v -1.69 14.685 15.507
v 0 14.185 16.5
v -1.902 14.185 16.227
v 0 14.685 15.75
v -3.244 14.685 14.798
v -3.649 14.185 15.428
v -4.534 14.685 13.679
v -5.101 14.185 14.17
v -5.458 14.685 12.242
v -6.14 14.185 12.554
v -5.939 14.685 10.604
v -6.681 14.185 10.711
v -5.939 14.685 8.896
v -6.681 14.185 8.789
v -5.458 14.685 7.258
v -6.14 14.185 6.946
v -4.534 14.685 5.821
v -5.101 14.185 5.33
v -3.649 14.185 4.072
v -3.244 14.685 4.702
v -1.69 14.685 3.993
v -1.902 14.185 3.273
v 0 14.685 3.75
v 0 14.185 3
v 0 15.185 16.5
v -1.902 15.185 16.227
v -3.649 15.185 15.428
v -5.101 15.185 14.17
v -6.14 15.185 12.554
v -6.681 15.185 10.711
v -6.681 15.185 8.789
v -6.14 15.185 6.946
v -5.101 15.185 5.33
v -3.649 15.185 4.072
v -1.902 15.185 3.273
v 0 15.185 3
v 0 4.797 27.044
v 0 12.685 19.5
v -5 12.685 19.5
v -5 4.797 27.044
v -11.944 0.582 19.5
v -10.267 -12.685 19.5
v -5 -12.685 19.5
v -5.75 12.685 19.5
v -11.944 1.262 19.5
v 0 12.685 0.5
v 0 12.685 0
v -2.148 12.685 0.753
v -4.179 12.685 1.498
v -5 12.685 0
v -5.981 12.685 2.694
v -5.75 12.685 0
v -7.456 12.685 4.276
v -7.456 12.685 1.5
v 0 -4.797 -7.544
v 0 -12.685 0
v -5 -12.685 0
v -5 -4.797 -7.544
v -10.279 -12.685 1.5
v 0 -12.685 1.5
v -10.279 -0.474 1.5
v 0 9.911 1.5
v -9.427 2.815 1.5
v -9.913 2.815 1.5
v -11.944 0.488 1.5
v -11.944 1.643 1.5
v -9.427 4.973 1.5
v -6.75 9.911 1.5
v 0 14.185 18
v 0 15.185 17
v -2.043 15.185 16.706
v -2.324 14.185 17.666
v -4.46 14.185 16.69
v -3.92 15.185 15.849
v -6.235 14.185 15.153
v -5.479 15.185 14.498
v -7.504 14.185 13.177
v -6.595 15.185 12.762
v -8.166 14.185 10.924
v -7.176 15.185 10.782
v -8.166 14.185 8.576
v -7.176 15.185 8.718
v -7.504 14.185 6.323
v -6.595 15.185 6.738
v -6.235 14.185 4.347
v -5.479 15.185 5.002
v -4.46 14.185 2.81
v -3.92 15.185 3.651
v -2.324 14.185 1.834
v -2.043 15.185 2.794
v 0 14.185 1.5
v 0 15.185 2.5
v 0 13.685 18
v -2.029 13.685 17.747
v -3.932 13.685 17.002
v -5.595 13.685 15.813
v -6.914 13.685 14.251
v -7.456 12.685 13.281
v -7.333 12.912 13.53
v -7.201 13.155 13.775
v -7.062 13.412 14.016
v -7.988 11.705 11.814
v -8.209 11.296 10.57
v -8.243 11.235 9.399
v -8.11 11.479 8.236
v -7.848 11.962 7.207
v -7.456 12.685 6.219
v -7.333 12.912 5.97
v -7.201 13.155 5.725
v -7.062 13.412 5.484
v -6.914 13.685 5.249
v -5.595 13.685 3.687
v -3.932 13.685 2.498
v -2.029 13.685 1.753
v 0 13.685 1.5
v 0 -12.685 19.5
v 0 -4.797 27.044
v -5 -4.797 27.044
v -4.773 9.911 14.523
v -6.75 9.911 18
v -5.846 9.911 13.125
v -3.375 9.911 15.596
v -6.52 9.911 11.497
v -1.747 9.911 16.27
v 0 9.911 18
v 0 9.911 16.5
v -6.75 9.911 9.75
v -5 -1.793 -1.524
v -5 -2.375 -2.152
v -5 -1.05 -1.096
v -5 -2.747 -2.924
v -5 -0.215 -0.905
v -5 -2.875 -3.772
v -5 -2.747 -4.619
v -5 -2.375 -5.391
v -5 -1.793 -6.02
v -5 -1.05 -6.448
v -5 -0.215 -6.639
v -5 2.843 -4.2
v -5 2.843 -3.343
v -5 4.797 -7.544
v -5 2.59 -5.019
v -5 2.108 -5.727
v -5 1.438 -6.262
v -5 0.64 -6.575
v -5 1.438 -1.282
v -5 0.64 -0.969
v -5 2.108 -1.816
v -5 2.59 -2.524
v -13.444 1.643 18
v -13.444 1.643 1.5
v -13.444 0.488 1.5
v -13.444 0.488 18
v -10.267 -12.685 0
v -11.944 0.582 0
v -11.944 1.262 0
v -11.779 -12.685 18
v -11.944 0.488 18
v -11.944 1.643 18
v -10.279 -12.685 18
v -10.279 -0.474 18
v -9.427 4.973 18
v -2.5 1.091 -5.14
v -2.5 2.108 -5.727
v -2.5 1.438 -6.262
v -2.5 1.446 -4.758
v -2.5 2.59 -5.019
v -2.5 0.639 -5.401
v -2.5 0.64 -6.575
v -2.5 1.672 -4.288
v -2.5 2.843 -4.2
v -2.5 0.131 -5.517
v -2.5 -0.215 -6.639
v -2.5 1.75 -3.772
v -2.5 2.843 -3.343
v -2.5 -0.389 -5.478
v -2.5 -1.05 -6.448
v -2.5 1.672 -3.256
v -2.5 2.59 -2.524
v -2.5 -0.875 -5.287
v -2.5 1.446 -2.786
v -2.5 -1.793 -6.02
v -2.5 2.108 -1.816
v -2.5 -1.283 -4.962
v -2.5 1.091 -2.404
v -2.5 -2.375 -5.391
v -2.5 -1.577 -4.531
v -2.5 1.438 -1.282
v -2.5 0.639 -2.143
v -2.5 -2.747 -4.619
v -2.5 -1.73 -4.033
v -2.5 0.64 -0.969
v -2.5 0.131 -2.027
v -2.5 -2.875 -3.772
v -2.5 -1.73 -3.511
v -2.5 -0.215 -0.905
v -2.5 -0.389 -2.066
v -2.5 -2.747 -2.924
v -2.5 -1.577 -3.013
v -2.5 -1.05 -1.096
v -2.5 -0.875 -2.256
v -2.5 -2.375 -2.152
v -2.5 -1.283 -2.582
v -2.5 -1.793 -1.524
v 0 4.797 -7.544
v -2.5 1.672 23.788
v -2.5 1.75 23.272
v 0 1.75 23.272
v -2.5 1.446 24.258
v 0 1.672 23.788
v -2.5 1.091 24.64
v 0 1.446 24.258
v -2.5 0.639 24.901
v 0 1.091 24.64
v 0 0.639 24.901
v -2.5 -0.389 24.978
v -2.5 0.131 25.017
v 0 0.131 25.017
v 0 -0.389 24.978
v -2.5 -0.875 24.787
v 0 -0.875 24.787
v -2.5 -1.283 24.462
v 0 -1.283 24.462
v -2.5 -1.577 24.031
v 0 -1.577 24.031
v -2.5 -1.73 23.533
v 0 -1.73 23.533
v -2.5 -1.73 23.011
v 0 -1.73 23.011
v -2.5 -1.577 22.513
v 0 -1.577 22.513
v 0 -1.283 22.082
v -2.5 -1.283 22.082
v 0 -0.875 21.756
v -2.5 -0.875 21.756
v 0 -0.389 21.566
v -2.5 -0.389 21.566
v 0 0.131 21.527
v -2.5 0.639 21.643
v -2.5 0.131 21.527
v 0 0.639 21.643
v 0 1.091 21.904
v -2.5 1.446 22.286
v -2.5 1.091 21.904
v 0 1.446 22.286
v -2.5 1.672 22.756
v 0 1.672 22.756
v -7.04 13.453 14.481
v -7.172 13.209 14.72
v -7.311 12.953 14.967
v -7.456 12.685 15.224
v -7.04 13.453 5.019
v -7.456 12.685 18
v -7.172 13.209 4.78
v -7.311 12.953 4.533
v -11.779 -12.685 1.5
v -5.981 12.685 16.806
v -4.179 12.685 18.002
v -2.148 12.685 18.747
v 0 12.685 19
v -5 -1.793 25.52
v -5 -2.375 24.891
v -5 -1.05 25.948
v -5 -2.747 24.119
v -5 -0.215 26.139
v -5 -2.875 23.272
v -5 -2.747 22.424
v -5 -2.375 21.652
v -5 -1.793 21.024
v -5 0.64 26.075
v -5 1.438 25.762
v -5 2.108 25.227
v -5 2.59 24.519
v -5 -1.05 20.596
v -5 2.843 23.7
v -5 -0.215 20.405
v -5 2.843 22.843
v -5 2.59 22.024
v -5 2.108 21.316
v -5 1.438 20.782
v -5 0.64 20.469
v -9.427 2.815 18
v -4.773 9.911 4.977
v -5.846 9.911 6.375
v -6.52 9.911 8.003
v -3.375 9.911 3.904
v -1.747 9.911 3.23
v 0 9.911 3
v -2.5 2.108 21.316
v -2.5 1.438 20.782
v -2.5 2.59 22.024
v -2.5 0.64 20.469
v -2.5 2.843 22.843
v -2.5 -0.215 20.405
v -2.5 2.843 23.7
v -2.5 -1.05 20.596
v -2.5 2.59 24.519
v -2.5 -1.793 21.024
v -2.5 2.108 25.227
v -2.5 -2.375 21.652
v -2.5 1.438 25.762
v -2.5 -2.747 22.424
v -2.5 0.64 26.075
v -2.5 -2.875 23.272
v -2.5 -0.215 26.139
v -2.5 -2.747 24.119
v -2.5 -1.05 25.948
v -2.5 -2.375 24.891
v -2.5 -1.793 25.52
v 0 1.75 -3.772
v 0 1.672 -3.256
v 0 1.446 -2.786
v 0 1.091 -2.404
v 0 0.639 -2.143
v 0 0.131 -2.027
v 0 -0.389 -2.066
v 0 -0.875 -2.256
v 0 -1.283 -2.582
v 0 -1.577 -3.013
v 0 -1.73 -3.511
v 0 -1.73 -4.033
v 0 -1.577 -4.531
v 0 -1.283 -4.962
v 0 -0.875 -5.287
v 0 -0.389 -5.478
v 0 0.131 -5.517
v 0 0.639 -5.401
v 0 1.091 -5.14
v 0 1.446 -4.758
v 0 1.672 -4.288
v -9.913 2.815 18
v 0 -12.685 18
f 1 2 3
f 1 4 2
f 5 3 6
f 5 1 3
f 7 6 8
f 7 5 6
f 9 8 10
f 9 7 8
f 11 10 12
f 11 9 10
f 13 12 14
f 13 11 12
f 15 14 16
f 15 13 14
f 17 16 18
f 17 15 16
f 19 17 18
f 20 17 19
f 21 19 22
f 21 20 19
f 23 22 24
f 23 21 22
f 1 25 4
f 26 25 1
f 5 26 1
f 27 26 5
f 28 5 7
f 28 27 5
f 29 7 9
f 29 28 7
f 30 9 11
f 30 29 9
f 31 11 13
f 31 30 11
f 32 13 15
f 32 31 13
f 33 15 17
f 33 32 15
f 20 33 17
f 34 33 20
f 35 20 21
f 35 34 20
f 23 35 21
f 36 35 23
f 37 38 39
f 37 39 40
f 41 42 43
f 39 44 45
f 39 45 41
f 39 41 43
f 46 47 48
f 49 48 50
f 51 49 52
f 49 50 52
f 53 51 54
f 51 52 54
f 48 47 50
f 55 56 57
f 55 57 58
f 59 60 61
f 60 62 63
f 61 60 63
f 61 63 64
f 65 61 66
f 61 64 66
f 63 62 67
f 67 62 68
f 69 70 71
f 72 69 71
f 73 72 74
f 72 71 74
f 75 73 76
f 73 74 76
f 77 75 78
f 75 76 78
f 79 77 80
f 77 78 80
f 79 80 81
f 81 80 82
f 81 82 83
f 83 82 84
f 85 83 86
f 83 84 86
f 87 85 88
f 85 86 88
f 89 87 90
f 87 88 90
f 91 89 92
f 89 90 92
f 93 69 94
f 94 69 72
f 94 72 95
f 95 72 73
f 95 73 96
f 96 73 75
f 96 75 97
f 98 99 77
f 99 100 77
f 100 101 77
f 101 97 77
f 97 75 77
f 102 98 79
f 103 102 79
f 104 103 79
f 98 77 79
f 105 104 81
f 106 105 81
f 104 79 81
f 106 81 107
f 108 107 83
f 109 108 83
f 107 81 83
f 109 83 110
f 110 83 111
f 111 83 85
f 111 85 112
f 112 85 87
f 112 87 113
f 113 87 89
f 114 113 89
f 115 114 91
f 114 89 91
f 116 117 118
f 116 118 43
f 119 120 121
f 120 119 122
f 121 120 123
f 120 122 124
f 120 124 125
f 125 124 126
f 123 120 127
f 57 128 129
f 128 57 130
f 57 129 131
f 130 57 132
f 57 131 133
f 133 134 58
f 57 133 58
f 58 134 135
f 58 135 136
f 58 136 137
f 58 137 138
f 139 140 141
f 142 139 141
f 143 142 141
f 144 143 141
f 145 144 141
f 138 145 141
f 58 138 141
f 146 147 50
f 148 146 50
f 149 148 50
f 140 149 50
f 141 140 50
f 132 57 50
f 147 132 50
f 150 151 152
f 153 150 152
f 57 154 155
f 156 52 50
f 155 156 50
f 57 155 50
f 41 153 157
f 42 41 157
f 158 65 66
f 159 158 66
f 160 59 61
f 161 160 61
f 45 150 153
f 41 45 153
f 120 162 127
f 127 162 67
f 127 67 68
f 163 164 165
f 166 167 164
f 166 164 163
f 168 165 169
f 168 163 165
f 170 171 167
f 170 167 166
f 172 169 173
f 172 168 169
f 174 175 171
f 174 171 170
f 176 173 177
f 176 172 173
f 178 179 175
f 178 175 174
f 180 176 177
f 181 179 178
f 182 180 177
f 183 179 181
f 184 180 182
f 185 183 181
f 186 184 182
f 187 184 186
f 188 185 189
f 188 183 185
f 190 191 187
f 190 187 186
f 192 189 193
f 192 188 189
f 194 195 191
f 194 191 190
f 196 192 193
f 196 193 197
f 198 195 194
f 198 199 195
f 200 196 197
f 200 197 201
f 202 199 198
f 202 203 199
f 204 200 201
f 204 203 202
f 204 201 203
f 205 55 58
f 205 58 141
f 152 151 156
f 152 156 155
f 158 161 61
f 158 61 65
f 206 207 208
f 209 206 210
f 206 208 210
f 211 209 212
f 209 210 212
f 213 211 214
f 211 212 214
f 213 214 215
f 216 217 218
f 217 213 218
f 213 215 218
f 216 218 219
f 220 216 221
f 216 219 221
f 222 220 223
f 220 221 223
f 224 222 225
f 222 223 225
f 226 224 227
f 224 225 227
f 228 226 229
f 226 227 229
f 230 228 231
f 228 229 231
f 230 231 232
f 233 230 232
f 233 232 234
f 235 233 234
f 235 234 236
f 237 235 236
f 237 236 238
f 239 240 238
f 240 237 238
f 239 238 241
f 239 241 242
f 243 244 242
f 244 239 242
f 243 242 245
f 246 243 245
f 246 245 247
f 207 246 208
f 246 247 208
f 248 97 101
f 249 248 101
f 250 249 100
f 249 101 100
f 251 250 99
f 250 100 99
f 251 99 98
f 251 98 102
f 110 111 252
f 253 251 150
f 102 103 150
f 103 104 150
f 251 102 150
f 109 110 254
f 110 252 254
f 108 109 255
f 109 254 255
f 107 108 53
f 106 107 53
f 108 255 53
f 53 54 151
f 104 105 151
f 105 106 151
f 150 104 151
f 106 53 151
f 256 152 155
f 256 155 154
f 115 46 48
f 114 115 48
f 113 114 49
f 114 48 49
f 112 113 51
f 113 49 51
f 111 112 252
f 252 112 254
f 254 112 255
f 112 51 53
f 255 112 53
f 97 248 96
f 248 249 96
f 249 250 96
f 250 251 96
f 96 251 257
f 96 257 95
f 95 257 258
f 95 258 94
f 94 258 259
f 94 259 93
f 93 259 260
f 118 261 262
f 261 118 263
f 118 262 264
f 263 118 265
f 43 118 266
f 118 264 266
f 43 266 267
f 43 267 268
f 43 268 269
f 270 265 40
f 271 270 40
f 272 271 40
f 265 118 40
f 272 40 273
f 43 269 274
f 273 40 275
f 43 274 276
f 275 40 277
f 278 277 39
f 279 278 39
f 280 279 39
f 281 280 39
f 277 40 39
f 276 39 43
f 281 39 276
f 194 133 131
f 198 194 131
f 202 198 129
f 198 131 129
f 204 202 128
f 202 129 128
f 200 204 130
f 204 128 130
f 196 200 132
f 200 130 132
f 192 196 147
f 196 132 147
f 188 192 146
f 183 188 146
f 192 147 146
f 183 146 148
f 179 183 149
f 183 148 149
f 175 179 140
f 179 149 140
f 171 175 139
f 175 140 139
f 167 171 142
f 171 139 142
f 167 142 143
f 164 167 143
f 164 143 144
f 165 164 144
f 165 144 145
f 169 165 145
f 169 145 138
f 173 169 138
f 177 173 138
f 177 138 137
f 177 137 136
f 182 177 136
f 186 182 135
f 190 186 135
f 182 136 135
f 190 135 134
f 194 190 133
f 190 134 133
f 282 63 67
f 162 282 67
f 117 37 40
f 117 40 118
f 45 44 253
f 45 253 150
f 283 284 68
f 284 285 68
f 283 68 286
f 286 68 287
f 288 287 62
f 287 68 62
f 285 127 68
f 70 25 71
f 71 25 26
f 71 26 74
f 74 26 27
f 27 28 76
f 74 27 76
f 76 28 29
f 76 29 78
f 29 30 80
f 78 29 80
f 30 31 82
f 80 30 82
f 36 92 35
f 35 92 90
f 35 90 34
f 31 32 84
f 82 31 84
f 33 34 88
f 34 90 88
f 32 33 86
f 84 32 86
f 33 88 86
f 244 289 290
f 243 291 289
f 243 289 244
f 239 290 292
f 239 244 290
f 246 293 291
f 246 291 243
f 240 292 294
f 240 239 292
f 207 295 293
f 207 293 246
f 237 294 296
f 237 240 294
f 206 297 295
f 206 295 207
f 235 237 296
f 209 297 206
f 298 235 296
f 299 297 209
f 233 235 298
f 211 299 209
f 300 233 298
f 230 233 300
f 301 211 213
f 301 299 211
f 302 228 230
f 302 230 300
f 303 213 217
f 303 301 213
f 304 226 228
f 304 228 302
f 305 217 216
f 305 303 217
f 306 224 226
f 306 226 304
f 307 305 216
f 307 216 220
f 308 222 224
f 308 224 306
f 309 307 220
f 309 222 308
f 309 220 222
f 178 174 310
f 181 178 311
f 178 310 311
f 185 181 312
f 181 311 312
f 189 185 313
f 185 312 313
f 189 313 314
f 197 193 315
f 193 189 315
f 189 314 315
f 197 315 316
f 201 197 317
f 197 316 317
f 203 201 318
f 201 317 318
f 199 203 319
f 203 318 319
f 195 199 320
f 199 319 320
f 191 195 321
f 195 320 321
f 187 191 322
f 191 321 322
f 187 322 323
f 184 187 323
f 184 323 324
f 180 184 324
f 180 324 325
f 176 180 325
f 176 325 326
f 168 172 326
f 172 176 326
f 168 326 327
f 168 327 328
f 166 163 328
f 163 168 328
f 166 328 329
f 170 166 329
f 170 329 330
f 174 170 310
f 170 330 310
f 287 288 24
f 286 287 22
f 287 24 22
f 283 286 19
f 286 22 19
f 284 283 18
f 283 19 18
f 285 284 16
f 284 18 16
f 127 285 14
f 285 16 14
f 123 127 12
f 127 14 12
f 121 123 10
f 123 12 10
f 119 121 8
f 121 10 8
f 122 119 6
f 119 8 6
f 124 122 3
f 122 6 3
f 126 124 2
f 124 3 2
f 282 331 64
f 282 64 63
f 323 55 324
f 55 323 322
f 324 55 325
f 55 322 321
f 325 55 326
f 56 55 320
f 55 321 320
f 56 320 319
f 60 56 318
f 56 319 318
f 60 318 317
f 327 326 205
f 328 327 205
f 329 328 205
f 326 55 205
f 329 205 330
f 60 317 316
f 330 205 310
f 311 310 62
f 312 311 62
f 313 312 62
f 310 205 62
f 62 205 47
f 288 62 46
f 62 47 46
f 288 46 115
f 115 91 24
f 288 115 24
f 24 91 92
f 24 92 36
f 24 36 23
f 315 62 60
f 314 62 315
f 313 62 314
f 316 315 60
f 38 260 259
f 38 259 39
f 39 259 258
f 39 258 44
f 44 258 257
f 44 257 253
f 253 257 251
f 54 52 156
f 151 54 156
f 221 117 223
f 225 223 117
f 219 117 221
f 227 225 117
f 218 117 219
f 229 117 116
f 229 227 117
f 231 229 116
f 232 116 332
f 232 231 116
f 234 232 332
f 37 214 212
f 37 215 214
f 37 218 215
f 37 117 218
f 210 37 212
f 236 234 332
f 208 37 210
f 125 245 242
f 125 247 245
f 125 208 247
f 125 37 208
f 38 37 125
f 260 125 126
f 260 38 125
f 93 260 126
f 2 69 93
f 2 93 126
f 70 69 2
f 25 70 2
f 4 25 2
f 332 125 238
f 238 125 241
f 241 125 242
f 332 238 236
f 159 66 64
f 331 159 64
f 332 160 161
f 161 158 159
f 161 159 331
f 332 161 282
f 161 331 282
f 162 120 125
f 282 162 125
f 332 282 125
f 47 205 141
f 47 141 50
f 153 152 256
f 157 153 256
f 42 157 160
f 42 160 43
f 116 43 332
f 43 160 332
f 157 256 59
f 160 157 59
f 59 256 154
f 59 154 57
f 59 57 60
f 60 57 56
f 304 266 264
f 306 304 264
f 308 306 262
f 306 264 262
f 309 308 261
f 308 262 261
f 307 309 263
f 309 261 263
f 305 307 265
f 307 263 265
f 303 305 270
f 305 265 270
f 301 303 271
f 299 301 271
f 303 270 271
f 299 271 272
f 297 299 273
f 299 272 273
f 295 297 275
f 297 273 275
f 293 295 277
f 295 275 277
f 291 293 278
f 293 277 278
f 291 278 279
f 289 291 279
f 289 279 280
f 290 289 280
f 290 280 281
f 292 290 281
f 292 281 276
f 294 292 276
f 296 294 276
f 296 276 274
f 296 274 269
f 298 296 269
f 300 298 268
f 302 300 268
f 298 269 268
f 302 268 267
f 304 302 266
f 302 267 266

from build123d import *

# Parameters (mm, degrees)
BOSS_EXTRUDE1_DEPTH = 19.5
BOSS_EXTRUDE5_DEPTH = 1.5
BOSS_EXTRUDE6_DEPTH = 1.5
SKETCH8_R           = 6.75
CUT_EXTRUDE2_DEPTH  = 35.70752685
BOSS_EXTRUDE7_DEPTH = 2.5
SKETCH10_R          = 1.75
BOSS_EXTRUDE8_DEPTH = 5
CHAMFER1_SIZE       = 1.5
CHAMFER2_SIZE       = 1
SKETCH11_R          = 2.875
SKETCH11_R_2        = 1.75
CUT_EXTRUDE4_DEPTH  = 2.5
REVOLVE1_ANGLE      = 180
CHAMFER3_SIZE       = 1


with BuildPart() as part:
    # Sketch1 → Boss-Extrude1 (new body)
    with BuildSketch(Plane.XY):
        Polygon((-11.779, -12.684829289), (-10.279, -12.684829289), (-10.279, -0.473504424), (-11.944063509, 0.487820441), (-11.944063509, 1.64252098), (-9.912974596, 2.815170711), (-9.427494989, 2.815170711), (-9.427494989, 4.973204454), (-6.75, 9.910826582), (0, 9.910826582), (0, 12.684829289), (-7.456216647, 12.684829289), (-13.444063509, 1.64252098), (-13.444063509, 0.487820441), align=None)
    extrude(amount=BOSS_EXTRUDE1_DEPTH)

    # Sketch6 → Boss-Extrude5 (add)
    with BuildSketch(Plane.XY.offset(19.5)):
        Polygon((0, 12.684829289), (-7.456216647, 12.684829289), (-13.444063509, 1.64252098), (-13.444063509, 0.487820441), (-11.779, -12.684829289), (0, -12.684829289), align=None)
    extrude(amount=-BOSS_EXTRUDE5_DEPTH)

    # Sketch7 → Boss-Extrude6 (add)
    with BuildSketch(Plane(origin=(0, 0, 0), x_dir=(-1, 0, 0), z_dir=(0, 0, -1))):
        Polygon((0, 12.684829289), (0, -12.684829289), (11.779, -12.684829289), (13.444063509, 0.487820441), (13.444063509, 1.64252098), (7.456216647, 12.684829289), align=None)
    extrude(amount=-BOSS_EXTRUDE6_DEPTH)

    # Sketch8 → Cut-Extrude2 (cut, through all)
    with BuildSketch(Plane(origin=(0, 12.684829289, 0), x_dir=(1, 0, 0), z_dir=(0, 1, 0))):
        with Locations((0, -9.75)):
            Circle(SKETCH8_R)
    extrude(amount=-CUT_EXTRUDE2_DEPTH, mode=Mode.SUBTRACT)

    # Sketch9 → Boss-Extrude7 (add, symmetric)
    with BuildSketch(Plane(origin=(0, 12.684829289, 0), x_dir=(1, 0, 0), z_dir=(0, 1, 0))):
        with BuildLine():
            Line((0, -1.5), (0, -3))
            ThreePointArc((0, -3), (-6.75, -9.75), (0, -16.5))
            Line((0, -16.5), (0, -18))
            ThreePointArc((0, -18), (-8.25, -9.75), (0, -1.5))
        make_face()
    extrude(amount=BOSS_EXTRUDE7_DEPTH, both=True)

    # Sketch10 → Boss-Extrude8 (add)
    with BuildSketch(Plane(origin=(0, 0, 0), x_dir=(0, 0, -1), z_dir=(1, 0, 0))):
        Polygon((-19.5, 12.684829289), (-27.043783602, 4.79693847), (-27.043783602, -4.79693847), (-19.5, -12.684829289), align=None)
        Polygon((-20.396891801, -1.659882024), (-20.396891801, 1.659882024), (-23.271891801, 3.319764048), (-26.146891801, 1.659882024), (-26.146891801, -1.659882024), (-23.271891801, -3.319764048), align=None, mode=Mode.SUBTRACT)
        Polygon((-23.271891801, -3.319764048), (-20.396891801, -1.659882024), (-20.396891801, 1.659882024), (-23.271891801, 3.319764048), (-26.146891801, 1.659882024), (-26.146891801, -1.659882024), align=None)
        with Locations(Location((-23.271891801, 0, 0), (0, 0, 90))):
            Circle(SKETCH10_R, mode=Mode.SUBTRACT)
        Polygon((7.543783602, 4.79693847), (0, 12.684829289), (0, -12.684829289), (7.543783602, -4.79693847), align=None)
        Polygon((6.646891801, 1.659882024), (3.771891801, 3.319764048), (0.896891801, 1.659882024), (0.896891801, -1.659882024), (3.771891801, -3.319764048), (6.646891801, -1.659882024), align=None, mode=Mode.SUBTRACT)
        Polygon((6.646891801, 1.659882024), (6.646891801, -1.659882024), (3.771891801, -3.319764048), (0.896891801, -1.659882024), (0.896891801, 1.659882024), (3.771891801, 3.319764048), align=None)
        with Locations(Location((3.771891801, 0, 0), (0, 0, 90))):
            Circle(SKETCH10_R, mode=Mode.SUBTRACT)
    extrude(amount=-BOSS_EXTRUDE8_DEPTH)

    # Chamfer1
    chamfer1_edges = [part.edges().sort_by_distance(p)[0] for p in [
        (-12.611531755, -6.098504424, 19.5),
        (-13.444063509, 1.065170711, 19.5),
        (-10.450140078, 7.163675135, 19.5),
        (-12.611531755, -6.098504424, 0),
        (-13.444063509, 1.065170711, 0),
        (-10.450140078, 7.163675135, 0),
    ]]
    chamfer(chamfer1_edges, length=CHAMFER1_SIZE)

    # Chamfer2
    chamfer2_edges = [part.edges().sort_by_distance(p)[0] for p in [
        (-8.25, 15.184829289, 9.75),
    ]]
    chamfer(chamfer2_edges, length=CHAMFER2_SIZE)

    # Sketch11 → Cut-Extrude4 (cut)
    with BuildSketch(Plane.ZY.offset(5)):
        with Locations(Location((-3.771891801, 0, 0), (0, 0, 270))):
            Circle(SKETCH11_R)
        with Locations(Location((-3.771891801, 0, 0), (0, 0, 90))):
            Circle(SKETCH11_R_2, mode=Mode.SUBTRACT)
        with Locations(Location((23.271891801, 0, 0), (0, 0, 270))):
            Circle(SKETCH11_R)
        with Locations(Location((23.271891801, 0, 0), (0, 0, 90))):
            Circle(SKETCH11_R_2, mode=Mode.SUBTRACT)
    extrude(amount=-CUT_EXTRUDE4_DEPTH, mode=Mode.SUBTRACT)

    # Sketch12 → Revolve1 (revolve)
    with BuildSketch(Plane(origin=(0, 0, 0), x_dir=(0, 0, -1), z_dir=(1, 0, 0))):
        Polygon((-16.5, 15.184829289), (-16.5, 14.184829289), (-15.75, 14.684829289), align=None)
    revolve(axis=Axis((0, 15.184829289, 9.75), (0, -1, 0)), revolution_arc=REVOLVE1_ANGLE)

    # Chamfer3
    chamfer3_edges = [part.edges().sort_by_distance(p)[0] for p in [
        (-4.412056396, 12.684829289, 2.77889834),
        (-4.412056396, 12.684829289, 16.72110166),
    ]]
    chamfer(chamfer3_edges, length=CHAMFER3_SIZE)


solid = part.part
